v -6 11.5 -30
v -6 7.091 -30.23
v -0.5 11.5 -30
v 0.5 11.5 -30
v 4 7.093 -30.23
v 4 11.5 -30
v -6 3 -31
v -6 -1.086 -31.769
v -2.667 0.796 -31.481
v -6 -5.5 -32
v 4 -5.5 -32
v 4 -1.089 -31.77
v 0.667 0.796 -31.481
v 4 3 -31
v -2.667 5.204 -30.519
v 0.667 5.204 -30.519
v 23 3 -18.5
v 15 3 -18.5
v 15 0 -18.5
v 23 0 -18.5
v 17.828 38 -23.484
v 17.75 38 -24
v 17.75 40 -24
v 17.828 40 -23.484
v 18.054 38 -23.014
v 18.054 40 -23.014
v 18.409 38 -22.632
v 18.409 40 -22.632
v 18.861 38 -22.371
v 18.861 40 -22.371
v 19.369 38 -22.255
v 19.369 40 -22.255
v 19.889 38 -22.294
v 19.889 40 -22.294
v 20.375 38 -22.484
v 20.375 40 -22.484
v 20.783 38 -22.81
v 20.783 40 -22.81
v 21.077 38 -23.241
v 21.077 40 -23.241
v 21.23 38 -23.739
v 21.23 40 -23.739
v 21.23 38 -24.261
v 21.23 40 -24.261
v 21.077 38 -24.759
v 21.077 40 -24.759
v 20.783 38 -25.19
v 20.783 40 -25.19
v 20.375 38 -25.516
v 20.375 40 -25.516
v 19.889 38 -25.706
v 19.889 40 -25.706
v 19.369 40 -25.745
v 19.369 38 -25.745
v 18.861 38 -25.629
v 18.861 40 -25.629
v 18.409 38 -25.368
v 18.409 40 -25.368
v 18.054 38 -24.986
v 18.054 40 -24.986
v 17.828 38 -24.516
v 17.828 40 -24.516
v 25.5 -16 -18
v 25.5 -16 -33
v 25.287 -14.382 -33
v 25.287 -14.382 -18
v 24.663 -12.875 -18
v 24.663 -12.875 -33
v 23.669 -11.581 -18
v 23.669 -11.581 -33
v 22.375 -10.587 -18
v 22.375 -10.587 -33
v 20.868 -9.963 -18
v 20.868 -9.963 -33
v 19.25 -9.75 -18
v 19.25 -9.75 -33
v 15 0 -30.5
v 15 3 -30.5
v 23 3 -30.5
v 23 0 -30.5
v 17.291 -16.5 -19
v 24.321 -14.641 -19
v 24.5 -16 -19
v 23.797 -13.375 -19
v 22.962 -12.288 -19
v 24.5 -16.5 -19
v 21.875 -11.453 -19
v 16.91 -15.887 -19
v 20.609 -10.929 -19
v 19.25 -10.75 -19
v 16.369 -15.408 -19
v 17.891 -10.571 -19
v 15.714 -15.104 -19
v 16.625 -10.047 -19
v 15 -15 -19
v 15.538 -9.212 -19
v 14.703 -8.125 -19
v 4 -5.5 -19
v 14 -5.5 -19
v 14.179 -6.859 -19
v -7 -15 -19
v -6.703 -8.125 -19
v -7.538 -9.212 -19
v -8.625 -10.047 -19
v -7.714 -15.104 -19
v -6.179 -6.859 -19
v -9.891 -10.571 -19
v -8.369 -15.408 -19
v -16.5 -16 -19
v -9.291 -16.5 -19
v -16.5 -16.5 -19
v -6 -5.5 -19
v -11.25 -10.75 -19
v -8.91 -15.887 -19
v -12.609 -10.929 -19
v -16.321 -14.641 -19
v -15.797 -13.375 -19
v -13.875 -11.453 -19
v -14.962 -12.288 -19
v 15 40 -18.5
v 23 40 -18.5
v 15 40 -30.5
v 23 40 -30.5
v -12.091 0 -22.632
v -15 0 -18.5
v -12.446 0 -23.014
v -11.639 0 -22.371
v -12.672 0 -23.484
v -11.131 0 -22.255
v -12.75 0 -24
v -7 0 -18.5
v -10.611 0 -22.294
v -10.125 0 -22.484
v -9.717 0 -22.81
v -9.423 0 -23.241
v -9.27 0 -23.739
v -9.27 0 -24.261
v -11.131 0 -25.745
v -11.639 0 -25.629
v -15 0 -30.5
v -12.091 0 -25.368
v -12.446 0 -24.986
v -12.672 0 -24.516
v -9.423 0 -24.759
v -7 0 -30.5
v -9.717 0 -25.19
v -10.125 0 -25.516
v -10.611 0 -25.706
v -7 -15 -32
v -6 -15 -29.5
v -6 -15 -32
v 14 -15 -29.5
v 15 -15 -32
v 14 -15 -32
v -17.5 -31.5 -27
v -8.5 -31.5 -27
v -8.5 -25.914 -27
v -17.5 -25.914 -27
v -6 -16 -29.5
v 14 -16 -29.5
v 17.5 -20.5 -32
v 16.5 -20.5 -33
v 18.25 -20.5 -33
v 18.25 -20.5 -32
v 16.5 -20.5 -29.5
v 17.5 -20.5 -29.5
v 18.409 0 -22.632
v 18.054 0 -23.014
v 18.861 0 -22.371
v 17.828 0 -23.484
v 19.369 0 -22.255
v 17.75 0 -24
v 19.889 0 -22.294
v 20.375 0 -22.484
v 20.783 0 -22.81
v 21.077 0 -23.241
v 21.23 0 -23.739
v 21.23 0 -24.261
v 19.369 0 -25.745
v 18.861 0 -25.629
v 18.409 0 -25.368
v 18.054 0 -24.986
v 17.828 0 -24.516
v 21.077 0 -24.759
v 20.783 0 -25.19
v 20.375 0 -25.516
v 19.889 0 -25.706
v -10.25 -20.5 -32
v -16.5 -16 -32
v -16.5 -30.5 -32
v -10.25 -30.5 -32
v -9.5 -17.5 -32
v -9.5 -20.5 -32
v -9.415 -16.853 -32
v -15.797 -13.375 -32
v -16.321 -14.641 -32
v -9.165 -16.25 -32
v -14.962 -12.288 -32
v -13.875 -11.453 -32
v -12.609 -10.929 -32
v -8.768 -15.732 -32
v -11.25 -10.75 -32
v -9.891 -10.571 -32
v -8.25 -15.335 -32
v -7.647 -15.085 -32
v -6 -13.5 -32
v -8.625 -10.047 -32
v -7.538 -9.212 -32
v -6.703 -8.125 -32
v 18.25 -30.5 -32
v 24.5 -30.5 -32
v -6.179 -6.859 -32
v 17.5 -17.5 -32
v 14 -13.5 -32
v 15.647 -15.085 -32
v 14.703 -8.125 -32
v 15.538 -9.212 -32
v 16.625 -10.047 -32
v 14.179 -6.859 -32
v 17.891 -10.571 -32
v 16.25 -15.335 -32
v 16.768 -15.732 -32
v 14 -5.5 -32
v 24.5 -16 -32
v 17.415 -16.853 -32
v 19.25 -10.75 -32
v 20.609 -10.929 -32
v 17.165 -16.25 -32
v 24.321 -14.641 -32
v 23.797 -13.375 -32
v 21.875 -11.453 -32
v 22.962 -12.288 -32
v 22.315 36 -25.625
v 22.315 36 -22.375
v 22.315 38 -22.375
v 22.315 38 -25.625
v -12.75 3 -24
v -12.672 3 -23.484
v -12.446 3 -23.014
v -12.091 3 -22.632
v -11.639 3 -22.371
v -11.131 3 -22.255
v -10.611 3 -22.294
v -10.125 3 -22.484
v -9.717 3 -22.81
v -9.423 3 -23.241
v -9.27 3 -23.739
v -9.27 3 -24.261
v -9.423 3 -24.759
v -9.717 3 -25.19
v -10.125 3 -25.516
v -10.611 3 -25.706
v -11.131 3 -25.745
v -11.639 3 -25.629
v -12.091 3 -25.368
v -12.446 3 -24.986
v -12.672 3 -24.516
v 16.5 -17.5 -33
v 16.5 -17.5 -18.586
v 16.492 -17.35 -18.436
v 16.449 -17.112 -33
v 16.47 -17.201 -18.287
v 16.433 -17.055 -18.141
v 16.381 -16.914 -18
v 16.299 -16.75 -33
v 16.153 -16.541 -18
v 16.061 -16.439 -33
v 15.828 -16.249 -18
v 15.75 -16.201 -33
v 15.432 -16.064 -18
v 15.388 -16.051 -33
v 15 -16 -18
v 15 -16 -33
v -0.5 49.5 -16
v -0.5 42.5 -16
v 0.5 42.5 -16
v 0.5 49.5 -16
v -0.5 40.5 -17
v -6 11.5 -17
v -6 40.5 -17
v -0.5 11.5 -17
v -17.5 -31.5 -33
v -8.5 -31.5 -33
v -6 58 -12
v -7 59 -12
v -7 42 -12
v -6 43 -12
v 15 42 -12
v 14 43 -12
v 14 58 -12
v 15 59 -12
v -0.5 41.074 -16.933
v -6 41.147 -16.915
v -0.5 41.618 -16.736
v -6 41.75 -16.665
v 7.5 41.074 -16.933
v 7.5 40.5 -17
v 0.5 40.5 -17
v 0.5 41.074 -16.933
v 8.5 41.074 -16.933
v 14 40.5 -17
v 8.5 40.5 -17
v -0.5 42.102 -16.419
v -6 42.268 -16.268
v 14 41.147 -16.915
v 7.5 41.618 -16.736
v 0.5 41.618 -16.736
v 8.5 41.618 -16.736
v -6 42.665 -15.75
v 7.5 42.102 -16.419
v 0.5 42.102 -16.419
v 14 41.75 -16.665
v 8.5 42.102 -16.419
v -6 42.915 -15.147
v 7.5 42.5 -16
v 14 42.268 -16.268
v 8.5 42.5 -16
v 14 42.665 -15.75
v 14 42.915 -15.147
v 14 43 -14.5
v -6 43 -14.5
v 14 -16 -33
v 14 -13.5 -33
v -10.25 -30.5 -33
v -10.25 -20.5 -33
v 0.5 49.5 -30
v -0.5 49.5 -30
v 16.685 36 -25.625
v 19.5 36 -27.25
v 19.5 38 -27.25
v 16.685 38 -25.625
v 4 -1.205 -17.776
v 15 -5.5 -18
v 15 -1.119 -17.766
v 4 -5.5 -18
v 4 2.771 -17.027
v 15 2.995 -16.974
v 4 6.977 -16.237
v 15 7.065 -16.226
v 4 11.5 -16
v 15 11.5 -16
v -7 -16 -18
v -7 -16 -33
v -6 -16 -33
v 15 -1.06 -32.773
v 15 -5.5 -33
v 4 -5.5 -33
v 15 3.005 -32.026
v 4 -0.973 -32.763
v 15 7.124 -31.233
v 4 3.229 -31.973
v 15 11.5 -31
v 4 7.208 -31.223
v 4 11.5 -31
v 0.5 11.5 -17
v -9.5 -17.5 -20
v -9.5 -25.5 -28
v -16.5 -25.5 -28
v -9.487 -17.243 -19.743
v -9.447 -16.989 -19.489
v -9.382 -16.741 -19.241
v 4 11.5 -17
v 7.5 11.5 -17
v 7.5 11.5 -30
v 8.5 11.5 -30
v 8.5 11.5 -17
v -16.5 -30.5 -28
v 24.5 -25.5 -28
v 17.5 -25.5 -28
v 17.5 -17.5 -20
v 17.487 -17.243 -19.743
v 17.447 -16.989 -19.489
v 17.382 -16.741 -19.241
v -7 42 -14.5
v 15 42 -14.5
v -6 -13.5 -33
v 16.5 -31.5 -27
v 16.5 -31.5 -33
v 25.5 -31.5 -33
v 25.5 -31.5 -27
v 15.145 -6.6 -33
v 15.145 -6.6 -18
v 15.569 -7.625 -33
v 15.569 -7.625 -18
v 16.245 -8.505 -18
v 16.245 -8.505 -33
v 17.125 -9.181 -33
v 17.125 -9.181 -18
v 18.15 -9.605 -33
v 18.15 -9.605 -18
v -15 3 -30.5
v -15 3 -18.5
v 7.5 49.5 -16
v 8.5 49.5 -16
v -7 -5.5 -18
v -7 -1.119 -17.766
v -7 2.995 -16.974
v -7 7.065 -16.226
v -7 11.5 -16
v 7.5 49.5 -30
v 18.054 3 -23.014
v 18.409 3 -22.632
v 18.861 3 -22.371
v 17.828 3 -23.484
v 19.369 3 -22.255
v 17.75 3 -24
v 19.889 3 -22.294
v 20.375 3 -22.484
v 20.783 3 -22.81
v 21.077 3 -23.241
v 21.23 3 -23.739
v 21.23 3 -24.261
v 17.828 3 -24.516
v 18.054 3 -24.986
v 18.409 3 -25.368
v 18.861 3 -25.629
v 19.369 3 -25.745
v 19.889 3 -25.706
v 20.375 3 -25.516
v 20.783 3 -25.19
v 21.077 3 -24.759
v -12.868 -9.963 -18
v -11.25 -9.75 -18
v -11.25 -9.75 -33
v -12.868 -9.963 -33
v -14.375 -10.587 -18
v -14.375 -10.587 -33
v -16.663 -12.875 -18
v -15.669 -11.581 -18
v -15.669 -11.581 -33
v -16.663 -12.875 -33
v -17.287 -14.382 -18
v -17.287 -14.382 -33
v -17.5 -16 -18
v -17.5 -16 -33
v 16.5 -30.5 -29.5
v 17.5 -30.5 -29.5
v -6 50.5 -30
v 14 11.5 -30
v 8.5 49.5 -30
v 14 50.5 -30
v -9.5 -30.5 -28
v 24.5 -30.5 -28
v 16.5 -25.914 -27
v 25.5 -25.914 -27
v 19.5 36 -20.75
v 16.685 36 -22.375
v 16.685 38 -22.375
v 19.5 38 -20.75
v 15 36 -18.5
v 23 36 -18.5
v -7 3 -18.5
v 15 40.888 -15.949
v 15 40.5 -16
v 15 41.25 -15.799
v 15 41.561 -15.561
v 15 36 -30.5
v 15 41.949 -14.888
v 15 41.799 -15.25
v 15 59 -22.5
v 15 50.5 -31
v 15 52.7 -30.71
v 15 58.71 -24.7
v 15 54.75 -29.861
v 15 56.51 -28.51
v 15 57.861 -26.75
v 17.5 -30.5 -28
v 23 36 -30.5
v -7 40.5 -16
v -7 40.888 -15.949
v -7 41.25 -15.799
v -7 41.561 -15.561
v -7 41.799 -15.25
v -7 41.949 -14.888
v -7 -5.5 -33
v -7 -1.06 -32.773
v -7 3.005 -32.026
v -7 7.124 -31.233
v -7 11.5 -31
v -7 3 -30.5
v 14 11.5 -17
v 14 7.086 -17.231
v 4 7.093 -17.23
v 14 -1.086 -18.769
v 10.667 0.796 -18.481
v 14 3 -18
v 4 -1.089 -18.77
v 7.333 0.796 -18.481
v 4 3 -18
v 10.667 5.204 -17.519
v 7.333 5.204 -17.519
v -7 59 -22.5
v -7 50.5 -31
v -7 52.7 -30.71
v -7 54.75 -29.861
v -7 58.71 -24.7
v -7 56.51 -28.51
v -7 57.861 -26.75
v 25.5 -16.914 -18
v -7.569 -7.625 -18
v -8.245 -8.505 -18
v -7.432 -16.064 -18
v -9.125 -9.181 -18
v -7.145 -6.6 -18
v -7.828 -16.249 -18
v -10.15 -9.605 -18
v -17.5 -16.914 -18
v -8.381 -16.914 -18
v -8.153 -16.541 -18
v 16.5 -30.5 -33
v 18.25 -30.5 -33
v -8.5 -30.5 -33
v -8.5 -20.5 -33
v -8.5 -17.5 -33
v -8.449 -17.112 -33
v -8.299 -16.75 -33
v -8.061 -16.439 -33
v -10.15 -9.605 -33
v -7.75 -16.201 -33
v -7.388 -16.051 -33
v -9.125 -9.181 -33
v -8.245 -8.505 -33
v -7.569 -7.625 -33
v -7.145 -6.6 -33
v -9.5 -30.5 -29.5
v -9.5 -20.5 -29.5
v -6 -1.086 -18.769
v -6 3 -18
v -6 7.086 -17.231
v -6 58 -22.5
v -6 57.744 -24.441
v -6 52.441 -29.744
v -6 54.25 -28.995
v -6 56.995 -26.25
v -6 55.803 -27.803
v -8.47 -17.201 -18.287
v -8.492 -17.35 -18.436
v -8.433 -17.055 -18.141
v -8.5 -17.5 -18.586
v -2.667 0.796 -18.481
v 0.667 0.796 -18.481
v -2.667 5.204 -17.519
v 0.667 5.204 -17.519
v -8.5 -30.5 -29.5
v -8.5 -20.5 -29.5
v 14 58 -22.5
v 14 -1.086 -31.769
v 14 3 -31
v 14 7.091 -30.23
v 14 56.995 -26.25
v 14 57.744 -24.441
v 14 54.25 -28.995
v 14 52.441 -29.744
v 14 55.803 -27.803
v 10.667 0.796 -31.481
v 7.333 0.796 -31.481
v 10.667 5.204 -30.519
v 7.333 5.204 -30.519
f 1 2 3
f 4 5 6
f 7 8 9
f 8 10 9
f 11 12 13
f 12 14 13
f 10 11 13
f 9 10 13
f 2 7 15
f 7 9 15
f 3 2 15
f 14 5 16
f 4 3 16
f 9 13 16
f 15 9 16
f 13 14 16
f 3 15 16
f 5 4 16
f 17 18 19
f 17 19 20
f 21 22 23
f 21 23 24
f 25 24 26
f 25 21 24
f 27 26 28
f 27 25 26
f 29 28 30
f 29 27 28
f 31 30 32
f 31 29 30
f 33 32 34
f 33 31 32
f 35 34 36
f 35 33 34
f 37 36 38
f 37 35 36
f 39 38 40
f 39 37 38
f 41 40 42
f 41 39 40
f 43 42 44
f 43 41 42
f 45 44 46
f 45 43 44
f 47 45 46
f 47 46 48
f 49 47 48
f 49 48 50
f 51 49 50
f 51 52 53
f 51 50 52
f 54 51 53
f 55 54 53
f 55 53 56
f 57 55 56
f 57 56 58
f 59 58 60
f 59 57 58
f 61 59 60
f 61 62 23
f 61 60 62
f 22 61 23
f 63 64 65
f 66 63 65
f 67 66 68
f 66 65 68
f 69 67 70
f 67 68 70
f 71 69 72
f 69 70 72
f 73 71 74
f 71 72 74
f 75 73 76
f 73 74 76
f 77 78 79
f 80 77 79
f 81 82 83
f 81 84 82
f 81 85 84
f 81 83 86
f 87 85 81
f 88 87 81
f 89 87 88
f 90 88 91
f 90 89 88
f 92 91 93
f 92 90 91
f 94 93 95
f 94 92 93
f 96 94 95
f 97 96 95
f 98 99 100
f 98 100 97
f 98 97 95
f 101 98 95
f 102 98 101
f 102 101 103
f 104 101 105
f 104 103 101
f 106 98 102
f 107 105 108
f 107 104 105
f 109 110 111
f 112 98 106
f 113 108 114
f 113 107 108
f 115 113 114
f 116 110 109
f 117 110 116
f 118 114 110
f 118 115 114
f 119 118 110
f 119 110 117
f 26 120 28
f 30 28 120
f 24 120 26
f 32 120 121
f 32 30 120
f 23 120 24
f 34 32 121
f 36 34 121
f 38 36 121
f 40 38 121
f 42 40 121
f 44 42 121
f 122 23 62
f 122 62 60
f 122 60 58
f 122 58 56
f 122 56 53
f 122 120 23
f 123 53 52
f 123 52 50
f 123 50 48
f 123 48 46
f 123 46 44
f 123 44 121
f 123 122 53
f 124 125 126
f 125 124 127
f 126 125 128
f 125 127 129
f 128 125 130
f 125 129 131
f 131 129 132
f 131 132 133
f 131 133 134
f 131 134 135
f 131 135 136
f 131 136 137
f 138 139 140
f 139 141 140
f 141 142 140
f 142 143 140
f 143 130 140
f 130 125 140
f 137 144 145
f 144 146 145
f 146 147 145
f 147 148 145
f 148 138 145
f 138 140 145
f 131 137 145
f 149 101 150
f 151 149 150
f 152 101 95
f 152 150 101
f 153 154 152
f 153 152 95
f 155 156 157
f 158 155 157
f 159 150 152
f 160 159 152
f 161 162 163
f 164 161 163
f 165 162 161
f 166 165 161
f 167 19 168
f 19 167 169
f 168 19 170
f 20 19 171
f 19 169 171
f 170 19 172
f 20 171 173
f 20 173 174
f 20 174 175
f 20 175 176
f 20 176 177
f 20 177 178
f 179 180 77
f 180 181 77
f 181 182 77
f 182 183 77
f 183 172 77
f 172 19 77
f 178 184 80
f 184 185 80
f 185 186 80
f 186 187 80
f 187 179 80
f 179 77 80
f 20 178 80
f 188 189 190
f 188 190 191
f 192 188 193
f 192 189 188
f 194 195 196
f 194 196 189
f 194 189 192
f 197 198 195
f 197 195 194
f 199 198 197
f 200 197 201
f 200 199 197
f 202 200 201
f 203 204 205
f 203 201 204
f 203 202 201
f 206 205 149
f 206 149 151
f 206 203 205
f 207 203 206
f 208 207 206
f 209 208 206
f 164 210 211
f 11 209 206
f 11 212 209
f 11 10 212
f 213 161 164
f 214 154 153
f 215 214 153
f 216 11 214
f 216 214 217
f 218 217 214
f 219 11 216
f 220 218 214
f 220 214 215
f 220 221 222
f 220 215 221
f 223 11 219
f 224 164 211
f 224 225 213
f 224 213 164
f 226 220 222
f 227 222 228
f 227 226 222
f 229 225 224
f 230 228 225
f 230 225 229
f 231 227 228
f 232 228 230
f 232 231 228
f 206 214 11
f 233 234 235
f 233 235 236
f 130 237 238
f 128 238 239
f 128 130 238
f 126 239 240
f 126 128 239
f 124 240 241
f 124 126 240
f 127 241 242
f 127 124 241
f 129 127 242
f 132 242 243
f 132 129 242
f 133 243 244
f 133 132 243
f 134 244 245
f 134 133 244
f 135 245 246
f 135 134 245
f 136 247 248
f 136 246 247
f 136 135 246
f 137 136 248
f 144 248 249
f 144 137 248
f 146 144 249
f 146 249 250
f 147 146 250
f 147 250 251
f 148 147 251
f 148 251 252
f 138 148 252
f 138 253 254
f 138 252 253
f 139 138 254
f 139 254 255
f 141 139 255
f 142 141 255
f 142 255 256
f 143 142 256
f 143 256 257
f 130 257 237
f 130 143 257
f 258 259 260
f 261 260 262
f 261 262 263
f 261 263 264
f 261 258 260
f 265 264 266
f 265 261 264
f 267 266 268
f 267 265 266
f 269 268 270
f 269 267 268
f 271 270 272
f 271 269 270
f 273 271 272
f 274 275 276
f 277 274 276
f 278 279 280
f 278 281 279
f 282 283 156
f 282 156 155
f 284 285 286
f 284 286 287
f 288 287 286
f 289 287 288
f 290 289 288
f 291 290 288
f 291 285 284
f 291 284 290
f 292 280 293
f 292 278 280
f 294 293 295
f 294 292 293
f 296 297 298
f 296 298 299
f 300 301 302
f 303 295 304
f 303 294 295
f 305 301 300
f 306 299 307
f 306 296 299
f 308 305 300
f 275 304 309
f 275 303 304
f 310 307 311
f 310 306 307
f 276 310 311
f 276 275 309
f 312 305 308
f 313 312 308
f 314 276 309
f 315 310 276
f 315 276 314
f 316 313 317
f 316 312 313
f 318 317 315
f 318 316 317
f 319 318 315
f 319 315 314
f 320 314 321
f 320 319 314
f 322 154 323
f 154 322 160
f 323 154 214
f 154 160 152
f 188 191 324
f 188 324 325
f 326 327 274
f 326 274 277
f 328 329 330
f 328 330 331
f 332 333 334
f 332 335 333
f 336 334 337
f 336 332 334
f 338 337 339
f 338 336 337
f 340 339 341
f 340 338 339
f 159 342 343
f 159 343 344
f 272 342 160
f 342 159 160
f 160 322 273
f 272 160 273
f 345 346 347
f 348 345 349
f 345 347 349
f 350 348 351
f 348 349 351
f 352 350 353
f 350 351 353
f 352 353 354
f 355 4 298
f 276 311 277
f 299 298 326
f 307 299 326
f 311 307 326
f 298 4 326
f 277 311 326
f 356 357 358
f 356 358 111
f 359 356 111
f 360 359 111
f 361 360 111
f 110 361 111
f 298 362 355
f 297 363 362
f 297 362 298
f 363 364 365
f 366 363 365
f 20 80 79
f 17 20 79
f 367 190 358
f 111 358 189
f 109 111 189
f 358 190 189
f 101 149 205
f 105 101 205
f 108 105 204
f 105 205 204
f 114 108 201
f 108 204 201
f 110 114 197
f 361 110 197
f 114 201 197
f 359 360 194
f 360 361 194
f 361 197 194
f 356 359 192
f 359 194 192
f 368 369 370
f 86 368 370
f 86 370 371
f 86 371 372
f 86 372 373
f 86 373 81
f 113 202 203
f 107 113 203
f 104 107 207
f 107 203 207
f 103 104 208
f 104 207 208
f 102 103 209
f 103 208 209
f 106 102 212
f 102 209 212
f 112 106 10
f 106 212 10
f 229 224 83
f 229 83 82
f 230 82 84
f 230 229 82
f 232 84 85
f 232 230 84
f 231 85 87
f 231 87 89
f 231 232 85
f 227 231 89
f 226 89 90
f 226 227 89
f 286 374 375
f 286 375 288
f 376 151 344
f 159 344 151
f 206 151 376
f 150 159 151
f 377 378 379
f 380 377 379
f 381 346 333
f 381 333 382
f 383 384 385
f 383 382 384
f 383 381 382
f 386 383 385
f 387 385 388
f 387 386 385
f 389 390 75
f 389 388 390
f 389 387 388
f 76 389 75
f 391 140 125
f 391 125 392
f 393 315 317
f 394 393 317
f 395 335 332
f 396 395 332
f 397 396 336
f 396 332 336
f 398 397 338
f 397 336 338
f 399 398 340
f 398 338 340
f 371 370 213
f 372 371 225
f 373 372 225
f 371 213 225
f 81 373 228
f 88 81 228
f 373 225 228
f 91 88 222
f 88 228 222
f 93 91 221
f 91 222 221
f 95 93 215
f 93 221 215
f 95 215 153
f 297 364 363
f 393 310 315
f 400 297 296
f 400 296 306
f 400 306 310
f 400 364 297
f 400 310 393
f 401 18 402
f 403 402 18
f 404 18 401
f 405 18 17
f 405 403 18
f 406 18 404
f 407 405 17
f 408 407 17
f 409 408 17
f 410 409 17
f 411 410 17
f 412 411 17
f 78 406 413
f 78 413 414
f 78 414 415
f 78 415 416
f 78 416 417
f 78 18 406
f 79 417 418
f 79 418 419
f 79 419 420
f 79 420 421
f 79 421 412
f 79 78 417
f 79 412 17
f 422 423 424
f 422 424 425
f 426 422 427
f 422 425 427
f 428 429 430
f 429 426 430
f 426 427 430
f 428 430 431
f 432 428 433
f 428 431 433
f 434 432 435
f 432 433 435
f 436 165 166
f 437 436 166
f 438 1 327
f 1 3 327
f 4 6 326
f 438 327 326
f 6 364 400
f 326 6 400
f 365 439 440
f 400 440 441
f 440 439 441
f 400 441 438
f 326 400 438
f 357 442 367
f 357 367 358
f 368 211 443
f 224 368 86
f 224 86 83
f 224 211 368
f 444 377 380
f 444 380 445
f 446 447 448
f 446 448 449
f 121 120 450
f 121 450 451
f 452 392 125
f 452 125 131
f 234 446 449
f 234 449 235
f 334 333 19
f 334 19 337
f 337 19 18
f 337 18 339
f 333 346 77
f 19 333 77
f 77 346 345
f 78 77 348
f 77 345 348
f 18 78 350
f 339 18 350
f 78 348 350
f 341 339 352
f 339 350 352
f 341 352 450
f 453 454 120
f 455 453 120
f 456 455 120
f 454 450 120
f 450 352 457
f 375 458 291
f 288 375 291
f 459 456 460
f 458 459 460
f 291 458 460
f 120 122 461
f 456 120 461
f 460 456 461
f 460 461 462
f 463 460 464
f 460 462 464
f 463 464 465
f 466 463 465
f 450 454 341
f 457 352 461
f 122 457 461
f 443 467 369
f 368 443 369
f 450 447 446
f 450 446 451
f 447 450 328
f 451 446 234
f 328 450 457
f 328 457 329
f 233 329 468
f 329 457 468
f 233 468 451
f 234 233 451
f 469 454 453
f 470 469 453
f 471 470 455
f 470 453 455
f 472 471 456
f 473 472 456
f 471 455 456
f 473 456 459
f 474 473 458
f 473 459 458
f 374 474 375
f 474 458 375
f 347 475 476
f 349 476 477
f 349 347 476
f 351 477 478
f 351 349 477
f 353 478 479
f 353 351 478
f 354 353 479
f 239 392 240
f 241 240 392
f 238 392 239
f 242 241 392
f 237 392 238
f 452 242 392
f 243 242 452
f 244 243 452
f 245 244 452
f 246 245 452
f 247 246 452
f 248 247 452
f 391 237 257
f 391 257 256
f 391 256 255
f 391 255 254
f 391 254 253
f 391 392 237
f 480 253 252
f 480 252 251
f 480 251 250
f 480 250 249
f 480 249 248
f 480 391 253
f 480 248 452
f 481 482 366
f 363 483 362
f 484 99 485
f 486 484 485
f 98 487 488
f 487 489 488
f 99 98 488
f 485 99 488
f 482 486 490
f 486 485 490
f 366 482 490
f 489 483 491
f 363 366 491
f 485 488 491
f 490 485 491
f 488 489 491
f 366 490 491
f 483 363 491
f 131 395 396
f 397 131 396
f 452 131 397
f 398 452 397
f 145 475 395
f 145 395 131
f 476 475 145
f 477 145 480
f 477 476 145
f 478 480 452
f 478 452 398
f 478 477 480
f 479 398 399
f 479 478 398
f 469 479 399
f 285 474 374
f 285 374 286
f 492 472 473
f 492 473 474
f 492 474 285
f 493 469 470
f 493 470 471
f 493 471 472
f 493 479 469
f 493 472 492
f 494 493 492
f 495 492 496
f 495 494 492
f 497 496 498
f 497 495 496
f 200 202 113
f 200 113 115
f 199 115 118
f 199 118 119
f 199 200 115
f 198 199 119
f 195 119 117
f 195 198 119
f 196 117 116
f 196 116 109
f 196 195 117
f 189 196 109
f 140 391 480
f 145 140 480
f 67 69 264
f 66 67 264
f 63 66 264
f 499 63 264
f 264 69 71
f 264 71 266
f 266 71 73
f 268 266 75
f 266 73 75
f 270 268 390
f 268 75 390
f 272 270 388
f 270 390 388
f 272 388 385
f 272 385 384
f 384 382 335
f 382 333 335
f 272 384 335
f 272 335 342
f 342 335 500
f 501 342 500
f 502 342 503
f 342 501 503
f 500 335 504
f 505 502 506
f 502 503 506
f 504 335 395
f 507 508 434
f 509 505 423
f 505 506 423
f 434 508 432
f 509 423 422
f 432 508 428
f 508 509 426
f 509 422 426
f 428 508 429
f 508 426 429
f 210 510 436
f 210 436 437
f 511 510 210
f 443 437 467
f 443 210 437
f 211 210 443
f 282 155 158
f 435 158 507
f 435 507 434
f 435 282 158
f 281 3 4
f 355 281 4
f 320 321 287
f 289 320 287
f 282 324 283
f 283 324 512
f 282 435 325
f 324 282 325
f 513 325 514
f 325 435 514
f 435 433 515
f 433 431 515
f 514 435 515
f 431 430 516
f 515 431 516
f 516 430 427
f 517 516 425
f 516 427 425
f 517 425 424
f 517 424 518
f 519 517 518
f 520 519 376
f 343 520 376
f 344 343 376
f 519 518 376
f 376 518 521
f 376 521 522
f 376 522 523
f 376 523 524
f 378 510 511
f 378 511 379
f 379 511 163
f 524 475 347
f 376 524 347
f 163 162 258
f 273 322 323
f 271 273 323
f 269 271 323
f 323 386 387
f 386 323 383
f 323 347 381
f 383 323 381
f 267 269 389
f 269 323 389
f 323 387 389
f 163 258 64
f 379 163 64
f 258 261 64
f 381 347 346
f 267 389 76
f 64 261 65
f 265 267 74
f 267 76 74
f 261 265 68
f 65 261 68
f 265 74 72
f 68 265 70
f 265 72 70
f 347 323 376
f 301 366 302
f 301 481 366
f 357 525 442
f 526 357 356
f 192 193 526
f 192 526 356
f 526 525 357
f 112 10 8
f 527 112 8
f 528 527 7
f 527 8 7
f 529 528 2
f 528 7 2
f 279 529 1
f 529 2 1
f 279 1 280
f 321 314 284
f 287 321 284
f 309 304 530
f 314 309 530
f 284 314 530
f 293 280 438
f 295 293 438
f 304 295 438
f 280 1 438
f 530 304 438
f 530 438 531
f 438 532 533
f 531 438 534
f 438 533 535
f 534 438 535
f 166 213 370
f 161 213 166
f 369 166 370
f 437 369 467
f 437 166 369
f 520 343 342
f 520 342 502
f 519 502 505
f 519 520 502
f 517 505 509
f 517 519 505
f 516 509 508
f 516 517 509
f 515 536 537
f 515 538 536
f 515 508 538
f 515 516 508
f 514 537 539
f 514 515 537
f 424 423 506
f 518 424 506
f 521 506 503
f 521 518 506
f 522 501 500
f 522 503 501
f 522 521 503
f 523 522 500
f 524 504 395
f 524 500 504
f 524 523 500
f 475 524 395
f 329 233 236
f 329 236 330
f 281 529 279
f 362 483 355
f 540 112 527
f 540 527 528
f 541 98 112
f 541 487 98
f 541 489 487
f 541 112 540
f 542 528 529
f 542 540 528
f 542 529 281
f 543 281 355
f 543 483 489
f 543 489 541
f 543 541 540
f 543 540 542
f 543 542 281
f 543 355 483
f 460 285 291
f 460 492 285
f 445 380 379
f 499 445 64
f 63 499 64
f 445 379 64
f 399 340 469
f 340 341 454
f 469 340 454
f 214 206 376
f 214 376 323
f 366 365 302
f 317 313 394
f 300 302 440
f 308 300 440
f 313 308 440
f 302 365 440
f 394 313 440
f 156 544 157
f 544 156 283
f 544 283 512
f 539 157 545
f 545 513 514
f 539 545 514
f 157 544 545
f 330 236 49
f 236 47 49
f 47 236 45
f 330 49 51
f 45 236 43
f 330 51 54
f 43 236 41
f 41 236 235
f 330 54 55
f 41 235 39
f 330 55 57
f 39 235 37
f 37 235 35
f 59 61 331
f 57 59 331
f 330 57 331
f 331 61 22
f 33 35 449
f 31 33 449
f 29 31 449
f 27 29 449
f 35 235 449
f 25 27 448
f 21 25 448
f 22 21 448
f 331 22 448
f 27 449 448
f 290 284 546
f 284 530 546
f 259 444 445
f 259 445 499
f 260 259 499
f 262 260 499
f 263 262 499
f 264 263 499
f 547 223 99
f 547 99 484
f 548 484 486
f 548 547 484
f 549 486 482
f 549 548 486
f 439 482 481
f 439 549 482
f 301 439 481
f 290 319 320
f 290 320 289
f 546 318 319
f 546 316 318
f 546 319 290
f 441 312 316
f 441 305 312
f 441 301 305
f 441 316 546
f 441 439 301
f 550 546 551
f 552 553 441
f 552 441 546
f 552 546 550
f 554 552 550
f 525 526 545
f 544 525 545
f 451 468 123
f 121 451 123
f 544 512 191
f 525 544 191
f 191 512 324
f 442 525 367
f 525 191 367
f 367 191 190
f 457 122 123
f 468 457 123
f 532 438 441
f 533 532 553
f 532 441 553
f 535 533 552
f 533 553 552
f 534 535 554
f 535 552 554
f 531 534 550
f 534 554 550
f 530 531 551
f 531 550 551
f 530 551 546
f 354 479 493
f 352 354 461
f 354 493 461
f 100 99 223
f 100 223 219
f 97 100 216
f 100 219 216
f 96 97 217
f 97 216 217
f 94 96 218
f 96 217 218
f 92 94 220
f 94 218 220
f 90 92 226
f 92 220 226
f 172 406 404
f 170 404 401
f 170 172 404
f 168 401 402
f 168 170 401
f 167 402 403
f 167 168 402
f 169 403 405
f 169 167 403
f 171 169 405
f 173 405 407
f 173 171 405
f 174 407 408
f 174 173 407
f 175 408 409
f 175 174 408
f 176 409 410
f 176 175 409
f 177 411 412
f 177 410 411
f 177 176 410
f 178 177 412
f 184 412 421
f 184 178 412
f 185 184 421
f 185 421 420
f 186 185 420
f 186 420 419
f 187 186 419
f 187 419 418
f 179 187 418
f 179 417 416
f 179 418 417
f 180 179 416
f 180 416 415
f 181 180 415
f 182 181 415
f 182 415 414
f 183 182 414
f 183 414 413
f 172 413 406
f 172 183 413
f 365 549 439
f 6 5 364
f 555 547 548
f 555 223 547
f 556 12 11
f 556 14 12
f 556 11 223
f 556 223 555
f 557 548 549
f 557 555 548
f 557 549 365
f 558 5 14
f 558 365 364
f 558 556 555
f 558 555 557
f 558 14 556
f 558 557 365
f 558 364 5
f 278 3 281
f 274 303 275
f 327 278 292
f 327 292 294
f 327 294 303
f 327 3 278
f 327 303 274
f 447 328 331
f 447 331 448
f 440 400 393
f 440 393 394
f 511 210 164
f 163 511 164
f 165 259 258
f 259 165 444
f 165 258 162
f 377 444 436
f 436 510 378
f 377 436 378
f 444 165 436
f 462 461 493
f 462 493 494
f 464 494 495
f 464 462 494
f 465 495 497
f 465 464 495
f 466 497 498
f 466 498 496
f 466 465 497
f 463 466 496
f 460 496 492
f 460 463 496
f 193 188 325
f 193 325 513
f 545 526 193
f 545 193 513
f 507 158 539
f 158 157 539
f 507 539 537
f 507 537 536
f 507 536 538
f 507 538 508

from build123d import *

# Parameters (mm, degrees)
PAD008_DEPTH         = 13
POCKET012_DEPTH      = 20.501
POCKET012_DEPTH_BACK = 20.501
SKETCH037_W          = 20
SKETCH037_H          = 63.5
PAD012_DEPTH         = 20
POCKET020_DEPTH      = 20.501
POCKET020_DEPTH_BACK = 20.501
THICKNESS_T          = 1
SKETCH028_W          = 20
SKETCH028_H          = 7
SKETCH028_W_2        = 28.5
SKETCH028_H_2        = 10
POCKET021_DEPTH      = 5
SKETCH029_W          = 9
SKETCH029_H          = 3
SKETCH029_W_2        = 9.0000000001
SKETCH029_H_2        = 4
PAD013_DEPTH         = 12
SKETCH030_R          = 1.75
POCKET022_DEPTH      = 59.0010001
POCKET023_DEPTH      = 2
SKETCH041_W          = 1
SKETCH041_H          = 38
PAD016_DEPTH         = 15


with BuildPart() as part:
    # Sketch020 → Pad008 (new body)
    with BuildSketch(Plane.XY):
        with BuildLine():
            Line((-13.5, 0), (-13.5, -10))
            Line((-13.5, -10), (-20.5, -10))
            Line((-20.5, -10), (-20.5, 4.5))
            ThreePointArc((-15.25, 9.75), (-18.9623106012, 8.2123106012), (-20.5, 4.5))
            ThreePointArc((-15.25, 9.7500000001), (-11.5376893988, 11.2876893988), (-10, 15))
            Line((-10, 15), (10, 15))
            ThreePointArc((10, 15), (11.5376893988, 11.2876893988), (15.25, 9.75))
            ThreePointArc((20.5, 4.5), (18.9623106012, 8.2123106012), (15.25, 9.75))
            Line((20.5, -10), (20.5, 4.5))
            Line((13.5, -10), (20.5, -10))
            Line((13.5, 0), (13.5, -10))
            Line((13.5, 0), (13.5, 3))
            ThreePointArc((13.5, 3), (12.767766953, 4.767766953), (11, 5.5))
            Line((-11, 5.5), (11, 5.5))
            ThreePointArc((-11, 5.5), (-12.767766953, 4.767766953), (-13.5, 3))
            Line((-13.5, 0), (-13.5, 3))
        make_face()
    extrude(amount=PAD008_DEPTH)

    # Sketch021 → Pocket012 (cut, two sides)
    with BuildSketch(Plane.YZ) as pocket012_sk:
        Polygon((-10, 4), (-5, 4), (10, 19), (-10, 19), align=None)
    extrude(amount=-POCKET012_DEPTH, mode=Mode.SUBTRACT)
    extrude(pocket012_sk.sketch, amount=POCKET012_DEPTH_BACK, mode=Mode.SUBTRACT)

    # Sketch037 → Pad012 (join)
    with BuildSketch(Plane.XY):
        with Locations((0, 46.75)):
            Rectangle(SKETCH037_W, SKETCH037_H)
    extrude(amount=PAD012_DEPTH)

    # Sketch038 → Pocket020 (cut, two sides)
    with BuildSketch(Plane.YZ) as pocket020_sk:
        with BuildLine():
            Line((15, 33), (15, 13))
            add(Edge.make_bspline(
                [(15, 13), (23.5, 13), (23.5, 15), (32, 15)],
                knots=[0, 0, 0, 0, 1, 1, 1, 1], degree=3))
            Line((32, 15), (61, 15))
            ThreePointArc((61, 15), (62.767766953, 15.732233047), (63.5, 17.5))
            Line((63.5, 17.5), (63.5, 33))
            Line((63.5, 33), (15, 33))
        make_face()
        with BuildLine():
            add(Edge.make_bspline(
                [(15, 0), (23.5, 0), (23.5, 2), (32, 2)],
                knots=[0, 0, 0, 0, 1, 1, 1, 1], degree=3))
            Line((32, 2), (71, 2))
            ThreePointArc((71, 2), (76.3033008589, 4.1966991411), (78.5, 9.5))
            Line((78.5, 9.5), (78.5, 33))
            Line((78.5, 33), (98.5, 33))
            Line((98.5, 33), (98.5, 0))
            Line((98.5, 0), (15, 0))
        make_face()
    extrude(amount=-POCKET020_DEPTH, mode=Mode.SUBTRACT)
    extrude(pocket020_sk.sketch, amount=POCKET020_DEPTH_BACK, mode=Mode.SUBTRACT)

    # Thickness
    thickness_openings = [part.faces().sort_by_distance(p)[0] for p in [
        (0, 71, 20),
    ]]
    offset(amount=THICKNESS_T, openings=thickness_openings, kind=Kind.INTERSECTION)

    # Sketch028 (on DatumPlane) → Pocket021 (cut)
    with BuildSketch(Plane.XY.offset(2.5)):
        with Locations((0, 3.5)):
            Rectangle(SKETCH028_W, SKETCH028_H)
        with Locations((0, -5)):
            Rectangle(SKETCH028_W_2, SKETCH028_H_2)
    extrude(amount=-POCKET021_DEPTH, mode=Mode.SUBTRACT)

    # Sketch029 (on DatumPlane) → Pad013 (join)
    with BuildSketch(Plane.XY.offset(1.5)):
        with Locations((14.5, 22)):
            Rectangle(SKETCH029_W, SKETCH029_H)
        with Locations((-14.5, 22)):
            Rectangle(SKETCH029_W, SKETCH029_H)
        with Locations((14.5, 58.5)):
            Rectangle(SKETCH029_W_2, SKETCH029_H_2)
    extrude(amount=PAD013_DEPTH)

    # Sketch030 (on DatumPlane) → Pocket022 (cut, through all)
    with BuildSketch(Plane(origin=(0, 20.5, 0), x_dir=(-1, 0, 0), z_dir=(0, 1, 0))):
        with Locations((-15.5, 8)):
            Circle(SKETCH030_R)
        with Locations((15, 8)):
            Circle(SKETCH030_R)
    extrude(amount=POCKET022_DEPTH, mode=Mode.SUBTRACT)

    # Sketch035 (on DatumPlane) → Pocket023 (cut)
    with BuildSketch(Plane(origin=(0, 56.5, 0), x_dir=(-1, 0, 0), z_dir=(0, 1, 0))):
        Polygon((-12.6854174377, 6.375), (-12.6854174377, 9.625), (-15.5, 11.25), (-18.3145825623, 9.625), (-18.3145825623, 6.375), (-15.5, 4.75), align=None)
    extrude(amount=POCKET023_DEPTH, mode=Mode.SUBTRACT)

    # Sketch041 (on DatumPlane) → Pad016 (join)
    with BuildSketch(Plane.XY.offset(1)):
        with Locations((-4, 51)):
            Rectangle(SKETCH041_W, SKETCH041_H)
        with Locations((4, 51)):
            Rectangle(SKETCH041_W, SKETCH041_H)
    extrude(amount=PAD016_DEPTH)


with BuildPart() as part_1:
    # Body003 placement: moved
    add(part.part.moved(Location((4, -20.5, -32))))


solid = part_1.part
